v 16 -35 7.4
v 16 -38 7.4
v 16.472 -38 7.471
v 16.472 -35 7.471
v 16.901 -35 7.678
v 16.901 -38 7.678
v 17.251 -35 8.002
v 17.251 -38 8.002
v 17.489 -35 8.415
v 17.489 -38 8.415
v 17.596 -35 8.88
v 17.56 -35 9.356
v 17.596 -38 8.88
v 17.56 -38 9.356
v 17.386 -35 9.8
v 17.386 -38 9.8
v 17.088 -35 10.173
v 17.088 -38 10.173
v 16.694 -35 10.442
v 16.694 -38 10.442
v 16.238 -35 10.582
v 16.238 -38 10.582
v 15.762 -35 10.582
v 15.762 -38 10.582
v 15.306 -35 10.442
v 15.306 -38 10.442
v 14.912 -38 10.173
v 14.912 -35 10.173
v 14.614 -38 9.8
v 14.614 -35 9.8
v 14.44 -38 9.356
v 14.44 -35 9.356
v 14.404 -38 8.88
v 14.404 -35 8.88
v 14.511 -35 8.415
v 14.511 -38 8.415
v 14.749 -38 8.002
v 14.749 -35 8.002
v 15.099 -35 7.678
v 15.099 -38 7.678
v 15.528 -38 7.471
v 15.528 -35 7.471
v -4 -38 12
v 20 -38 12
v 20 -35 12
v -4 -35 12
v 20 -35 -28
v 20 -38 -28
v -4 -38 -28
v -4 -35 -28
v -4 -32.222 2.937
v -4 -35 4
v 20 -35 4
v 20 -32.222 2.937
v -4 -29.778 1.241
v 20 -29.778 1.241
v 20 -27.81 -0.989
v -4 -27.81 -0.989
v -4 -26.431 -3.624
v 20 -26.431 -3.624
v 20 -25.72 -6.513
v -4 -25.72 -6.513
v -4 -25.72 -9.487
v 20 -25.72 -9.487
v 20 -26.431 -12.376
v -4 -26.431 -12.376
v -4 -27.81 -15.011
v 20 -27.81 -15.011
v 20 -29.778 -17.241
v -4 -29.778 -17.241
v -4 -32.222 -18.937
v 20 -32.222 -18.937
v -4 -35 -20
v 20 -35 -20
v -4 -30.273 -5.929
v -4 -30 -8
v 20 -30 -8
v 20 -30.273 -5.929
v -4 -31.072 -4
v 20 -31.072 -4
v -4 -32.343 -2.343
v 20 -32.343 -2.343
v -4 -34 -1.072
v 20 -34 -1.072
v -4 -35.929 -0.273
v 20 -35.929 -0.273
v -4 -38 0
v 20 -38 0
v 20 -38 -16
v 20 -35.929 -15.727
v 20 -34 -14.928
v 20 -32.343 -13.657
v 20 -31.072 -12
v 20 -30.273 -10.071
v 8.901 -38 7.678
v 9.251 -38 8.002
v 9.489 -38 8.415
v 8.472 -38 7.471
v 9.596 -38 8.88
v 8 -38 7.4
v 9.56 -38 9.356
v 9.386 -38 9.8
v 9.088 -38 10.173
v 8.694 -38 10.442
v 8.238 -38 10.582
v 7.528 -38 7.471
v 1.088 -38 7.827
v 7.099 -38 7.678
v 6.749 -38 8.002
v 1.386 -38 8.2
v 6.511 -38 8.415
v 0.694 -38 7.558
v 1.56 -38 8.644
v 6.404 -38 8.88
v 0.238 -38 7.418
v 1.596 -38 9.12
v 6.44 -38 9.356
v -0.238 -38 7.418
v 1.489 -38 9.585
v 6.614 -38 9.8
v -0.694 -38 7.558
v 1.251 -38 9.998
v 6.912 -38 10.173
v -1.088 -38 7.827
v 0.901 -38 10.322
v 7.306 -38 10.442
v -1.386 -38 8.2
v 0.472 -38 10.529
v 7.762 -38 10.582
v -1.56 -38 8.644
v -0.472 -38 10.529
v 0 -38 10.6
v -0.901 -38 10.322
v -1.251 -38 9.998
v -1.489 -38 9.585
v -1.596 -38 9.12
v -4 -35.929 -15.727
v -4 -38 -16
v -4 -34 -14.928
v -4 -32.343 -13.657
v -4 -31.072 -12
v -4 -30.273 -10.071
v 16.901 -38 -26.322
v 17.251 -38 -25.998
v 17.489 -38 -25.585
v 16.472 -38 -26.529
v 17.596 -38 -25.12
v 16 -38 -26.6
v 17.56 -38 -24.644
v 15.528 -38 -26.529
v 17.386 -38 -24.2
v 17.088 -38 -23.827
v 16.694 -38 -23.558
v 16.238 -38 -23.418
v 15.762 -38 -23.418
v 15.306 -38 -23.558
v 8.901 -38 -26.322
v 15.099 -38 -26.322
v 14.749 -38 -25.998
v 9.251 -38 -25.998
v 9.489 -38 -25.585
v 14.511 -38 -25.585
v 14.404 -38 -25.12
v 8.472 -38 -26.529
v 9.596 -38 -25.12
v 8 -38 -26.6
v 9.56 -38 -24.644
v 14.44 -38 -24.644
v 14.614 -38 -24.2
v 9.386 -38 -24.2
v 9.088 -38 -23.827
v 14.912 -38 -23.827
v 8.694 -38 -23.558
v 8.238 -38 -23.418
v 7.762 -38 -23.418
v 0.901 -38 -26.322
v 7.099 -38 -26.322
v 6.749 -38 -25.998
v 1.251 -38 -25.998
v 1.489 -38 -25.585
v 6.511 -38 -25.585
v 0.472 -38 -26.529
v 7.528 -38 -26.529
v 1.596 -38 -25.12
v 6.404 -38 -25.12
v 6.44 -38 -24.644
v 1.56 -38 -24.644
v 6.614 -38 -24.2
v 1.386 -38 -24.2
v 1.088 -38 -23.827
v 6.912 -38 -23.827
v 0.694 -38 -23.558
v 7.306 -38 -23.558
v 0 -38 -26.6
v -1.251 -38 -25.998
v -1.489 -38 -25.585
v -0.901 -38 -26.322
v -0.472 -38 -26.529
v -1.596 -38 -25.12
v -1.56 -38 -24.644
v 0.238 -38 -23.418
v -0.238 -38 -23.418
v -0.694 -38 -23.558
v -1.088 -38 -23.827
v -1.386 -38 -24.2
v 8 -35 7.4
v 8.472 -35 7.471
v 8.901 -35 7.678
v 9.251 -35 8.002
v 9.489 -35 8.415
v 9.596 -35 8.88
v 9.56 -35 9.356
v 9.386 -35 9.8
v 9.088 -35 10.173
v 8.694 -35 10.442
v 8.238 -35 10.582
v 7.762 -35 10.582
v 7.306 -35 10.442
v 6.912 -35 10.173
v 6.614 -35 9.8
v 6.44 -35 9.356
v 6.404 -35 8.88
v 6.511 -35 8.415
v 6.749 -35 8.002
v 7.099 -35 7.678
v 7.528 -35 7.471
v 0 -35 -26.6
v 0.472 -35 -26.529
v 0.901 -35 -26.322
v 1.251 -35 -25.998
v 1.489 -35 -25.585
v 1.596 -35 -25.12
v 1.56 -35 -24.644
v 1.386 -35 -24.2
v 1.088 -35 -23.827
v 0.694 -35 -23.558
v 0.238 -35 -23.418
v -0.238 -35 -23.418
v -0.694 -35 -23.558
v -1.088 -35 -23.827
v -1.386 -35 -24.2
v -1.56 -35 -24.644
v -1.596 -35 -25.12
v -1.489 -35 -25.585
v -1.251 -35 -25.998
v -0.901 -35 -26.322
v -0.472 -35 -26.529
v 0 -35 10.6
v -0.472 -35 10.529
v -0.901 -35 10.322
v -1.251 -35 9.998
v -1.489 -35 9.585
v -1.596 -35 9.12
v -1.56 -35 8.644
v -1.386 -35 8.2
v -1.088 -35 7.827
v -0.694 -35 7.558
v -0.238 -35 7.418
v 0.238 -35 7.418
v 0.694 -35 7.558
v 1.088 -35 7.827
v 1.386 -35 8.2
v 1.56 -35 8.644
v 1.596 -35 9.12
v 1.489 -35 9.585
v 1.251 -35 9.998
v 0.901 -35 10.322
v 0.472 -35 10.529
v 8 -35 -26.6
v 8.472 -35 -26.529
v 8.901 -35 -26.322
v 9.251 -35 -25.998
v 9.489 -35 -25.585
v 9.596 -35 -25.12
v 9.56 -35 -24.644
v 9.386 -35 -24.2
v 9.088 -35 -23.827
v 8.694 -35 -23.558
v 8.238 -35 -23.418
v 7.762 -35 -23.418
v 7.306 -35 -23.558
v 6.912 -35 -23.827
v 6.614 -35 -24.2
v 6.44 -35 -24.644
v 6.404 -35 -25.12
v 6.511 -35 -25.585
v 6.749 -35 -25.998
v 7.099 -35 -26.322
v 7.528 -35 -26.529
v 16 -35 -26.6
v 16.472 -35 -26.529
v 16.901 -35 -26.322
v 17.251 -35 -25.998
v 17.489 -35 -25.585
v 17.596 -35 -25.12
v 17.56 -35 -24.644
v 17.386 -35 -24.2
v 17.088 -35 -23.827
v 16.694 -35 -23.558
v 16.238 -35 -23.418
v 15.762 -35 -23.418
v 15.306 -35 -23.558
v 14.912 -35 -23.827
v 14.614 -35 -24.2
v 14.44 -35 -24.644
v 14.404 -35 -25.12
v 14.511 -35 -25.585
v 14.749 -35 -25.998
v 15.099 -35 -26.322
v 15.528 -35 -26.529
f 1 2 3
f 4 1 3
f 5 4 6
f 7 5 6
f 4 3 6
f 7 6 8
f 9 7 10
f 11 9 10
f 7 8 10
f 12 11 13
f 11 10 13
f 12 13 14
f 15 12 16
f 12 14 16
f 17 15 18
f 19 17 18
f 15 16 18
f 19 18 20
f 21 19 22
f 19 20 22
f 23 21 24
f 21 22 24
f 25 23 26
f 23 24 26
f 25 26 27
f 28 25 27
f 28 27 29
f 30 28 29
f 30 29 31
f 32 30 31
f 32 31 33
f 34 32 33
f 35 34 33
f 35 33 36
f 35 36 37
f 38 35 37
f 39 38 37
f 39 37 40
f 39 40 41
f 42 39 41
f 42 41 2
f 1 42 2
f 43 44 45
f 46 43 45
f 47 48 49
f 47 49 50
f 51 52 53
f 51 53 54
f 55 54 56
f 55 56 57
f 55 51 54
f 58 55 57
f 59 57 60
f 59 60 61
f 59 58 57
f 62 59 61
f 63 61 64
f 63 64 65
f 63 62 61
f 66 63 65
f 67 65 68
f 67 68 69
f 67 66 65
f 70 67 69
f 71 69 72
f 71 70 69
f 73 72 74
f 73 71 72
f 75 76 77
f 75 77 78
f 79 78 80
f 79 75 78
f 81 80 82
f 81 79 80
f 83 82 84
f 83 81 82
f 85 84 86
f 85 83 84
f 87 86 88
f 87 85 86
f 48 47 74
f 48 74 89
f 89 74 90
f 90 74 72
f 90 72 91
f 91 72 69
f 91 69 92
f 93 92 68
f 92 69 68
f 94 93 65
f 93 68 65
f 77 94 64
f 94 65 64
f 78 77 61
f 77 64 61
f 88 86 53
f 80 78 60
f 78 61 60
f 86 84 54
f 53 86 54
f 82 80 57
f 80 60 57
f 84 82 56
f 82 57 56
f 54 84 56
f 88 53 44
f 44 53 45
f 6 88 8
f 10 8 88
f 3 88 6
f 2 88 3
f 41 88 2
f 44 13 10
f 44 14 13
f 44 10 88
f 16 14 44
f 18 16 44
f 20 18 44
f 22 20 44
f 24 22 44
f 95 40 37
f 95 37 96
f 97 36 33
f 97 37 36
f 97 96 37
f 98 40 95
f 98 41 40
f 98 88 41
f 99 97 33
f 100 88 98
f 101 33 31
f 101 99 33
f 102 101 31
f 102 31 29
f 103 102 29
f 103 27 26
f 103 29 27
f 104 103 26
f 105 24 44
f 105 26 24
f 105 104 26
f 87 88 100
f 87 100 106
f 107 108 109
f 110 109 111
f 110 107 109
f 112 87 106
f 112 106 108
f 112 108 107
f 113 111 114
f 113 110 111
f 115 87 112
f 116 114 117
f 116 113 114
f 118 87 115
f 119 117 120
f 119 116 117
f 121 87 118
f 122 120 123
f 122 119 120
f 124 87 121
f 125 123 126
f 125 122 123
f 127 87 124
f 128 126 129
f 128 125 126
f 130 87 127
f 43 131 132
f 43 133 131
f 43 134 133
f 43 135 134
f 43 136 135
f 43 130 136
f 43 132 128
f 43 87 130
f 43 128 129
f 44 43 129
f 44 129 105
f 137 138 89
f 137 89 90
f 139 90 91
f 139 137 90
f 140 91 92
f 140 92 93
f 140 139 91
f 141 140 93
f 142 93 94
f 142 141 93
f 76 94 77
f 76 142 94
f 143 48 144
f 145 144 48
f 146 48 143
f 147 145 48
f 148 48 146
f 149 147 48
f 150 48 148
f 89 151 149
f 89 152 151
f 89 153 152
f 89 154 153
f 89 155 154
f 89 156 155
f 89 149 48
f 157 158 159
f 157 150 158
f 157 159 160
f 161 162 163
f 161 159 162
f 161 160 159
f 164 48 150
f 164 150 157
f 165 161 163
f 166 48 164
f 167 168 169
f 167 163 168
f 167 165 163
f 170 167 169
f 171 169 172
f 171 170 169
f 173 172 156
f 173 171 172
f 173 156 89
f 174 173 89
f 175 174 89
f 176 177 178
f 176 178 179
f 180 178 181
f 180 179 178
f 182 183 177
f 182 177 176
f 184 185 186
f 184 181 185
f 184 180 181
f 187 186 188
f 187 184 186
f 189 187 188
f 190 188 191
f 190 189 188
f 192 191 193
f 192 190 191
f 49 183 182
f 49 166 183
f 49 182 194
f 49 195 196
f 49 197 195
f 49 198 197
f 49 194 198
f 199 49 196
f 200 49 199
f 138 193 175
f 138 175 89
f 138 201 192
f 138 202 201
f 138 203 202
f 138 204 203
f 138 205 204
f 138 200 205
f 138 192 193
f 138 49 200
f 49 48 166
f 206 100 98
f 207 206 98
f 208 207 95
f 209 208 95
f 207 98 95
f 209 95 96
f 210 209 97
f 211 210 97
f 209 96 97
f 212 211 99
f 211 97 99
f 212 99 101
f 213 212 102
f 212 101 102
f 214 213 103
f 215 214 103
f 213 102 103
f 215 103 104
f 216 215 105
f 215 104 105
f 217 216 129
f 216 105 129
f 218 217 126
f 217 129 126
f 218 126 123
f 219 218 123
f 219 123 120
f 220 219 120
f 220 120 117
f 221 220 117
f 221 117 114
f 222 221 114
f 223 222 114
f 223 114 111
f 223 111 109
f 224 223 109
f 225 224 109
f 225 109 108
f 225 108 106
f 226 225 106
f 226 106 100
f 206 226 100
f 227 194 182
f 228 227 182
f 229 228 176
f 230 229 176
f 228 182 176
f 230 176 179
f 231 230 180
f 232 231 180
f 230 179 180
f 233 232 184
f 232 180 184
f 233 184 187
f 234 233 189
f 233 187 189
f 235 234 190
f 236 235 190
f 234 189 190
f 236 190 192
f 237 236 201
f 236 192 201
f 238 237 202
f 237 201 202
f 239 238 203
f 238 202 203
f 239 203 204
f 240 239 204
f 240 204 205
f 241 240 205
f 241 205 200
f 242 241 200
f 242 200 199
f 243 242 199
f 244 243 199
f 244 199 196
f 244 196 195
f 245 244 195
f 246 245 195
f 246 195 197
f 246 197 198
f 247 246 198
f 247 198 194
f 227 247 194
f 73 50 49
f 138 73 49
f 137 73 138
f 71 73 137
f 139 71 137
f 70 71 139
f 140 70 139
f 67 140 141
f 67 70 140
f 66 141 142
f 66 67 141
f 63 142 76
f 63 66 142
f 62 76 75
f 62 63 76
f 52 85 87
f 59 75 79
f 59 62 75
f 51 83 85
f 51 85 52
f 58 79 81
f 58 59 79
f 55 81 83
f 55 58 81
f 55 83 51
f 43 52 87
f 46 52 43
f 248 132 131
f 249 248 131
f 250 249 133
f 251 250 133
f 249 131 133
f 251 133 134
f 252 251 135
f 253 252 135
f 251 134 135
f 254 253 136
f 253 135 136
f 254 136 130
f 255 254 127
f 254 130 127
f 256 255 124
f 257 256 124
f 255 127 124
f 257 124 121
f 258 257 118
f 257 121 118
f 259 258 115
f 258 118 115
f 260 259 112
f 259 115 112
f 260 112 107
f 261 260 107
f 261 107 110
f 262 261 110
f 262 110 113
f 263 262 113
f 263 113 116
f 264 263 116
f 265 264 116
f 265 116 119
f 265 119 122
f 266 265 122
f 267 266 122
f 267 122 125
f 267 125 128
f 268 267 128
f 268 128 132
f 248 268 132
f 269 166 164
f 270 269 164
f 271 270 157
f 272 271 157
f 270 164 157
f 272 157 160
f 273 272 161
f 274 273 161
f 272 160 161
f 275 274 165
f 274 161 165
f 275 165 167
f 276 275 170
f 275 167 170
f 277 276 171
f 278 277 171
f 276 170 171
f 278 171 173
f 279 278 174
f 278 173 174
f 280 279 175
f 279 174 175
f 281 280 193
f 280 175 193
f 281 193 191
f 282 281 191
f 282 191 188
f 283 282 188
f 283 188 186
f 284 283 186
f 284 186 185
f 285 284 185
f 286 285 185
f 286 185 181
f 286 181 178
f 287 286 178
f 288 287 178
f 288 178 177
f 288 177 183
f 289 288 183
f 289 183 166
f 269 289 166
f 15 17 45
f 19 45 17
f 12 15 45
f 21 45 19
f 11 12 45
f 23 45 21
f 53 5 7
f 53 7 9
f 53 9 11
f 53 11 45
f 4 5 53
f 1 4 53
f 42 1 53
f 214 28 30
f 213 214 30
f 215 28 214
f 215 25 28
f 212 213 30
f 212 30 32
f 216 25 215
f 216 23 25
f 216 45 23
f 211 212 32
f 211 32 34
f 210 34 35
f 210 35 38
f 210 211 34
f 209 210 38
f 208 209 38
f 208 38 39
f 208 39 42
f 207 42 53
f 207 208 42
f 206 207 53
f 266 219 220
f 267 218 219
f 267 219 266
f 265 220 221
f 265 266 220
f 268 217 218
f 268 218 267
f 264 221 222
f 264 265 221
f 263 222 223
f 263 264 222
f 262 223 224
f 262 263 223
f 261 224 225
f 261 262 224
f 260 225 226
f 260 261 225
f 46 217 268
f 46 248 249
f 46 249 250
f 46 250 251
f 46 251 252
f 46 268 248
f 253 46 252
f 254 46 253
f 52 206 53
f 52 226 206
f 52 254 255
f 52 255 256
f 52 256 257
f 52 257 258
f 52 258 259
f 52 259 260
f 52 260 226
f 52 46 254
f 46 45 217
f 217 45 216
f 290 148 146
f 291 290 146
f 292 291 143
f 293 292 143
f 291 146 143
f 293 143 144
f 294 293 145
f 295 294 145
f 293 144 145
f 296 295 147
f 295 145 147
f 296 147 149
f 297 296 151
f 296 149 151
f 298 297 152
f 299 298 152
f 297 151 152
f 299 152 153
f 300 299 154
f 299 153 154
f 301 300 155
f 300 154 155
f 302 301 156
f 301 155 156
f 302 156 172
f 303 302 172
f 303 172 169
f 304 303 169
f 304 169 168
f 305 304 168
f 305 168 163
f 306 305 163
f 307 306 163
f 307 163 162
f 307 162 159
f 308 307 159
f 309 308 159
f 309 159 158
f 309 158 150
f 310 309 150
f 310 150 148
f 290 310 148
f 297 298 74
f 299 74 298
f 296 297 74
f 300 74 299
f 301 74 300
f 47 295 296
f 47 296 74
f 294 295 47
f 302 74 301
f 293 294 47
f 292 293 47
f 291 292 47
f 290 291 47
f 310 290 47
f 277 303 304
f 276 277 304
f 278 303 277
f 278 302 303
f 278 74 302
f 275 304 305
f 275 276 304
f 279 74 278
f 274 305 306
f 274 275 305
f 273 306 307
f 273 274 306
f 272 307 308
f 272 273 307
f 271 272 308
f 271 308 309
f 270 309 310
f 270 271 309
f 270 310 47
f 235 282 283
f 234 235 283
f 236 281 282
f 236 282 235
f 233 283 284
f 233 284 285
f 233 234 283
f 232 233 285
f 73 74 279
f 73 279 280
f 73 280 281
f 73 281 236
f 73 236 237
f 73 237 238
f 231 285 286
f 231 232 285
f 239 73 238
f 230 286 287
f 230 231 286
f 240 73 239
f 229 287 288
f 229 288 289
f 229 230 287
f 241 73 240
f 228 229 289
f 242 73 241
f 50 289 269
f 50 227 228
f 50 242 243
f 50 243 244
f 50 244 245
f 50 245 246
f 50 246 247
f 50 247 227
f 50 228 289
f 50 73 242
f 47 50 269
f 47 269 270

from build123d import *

# Parameters (mm, degrees)
SKETCH_1_W          = 16
SKETCH_1_H          = 16
EXTRUDE_1_DEPTH     = 20
SKETCH_2_W          = 24
SKETCH_2_H          = 24
EXTRUDE_4_DEPTH     = 10
SKETCH_3_W          = 4
SKETCH_3_H          = 3
EXTRUDE_6_DEPTH     = 24
SKETCH_5_R          = 1.6
CUT_EXTRUDE_1_DEPTH = 24
CUT_EXTRUDE_2_DEPTH = 24


with BuildPart() as part:
    # 草图1 → 凸台-拉伸1 (new body)
    with BuildSketch(Plane(origin=(0, 0, 0), x_dir=(1, 0, 0), z_dir=(0, 1, 0))):
        Polygon((-4, 20), (-4, 16), (-4, -4), (16, -4), (20, -4), (20, 0), (20, 20), (0, 20), align=None)
        with Locations((8, 8)):
            Rectangle(SKETCH_1_W, SKETCH_1_H, mode=Mode.SUBTRACT)
    extrude(amount=-EXTRUDE_1_DEPTH)

    # 草图2 → 凸台-拉伸4 (add)
    with BuildSketch(Plane.XZ.offset(20)):
        with Locations((8, -8)):
            Rectangle(SKETCH_2_W, SKETCH_2_H)
    extrude(amount=EXTRUDE_4_DEPTH)

    # 草图3 → 凸台-拉伸6 (add)
    with BuildSketch(Plane.ZY.offset(4)):
        with Locations((10, -36.5)):
            Rectangle(SKETCH_3_W, SKETCH_3_H)
        with BuildLine():
            Line((4, -35), (4, -30))
            Line((4, -30), (-8.000000062, -30))
            ThreePointArc((-8.000000062, -30), (-2.343145773, -32.343145728), (0, -38))
            Line((0, -38), (8, -38))
            Line((8, -38), (8, -35))
            Line((8, -35), (4, -35))
        make_face()
        with BuildLine():
            ThreePointArc((-16, -38), (-13.656854272, -32.343145773), (-8.000000062, -30))
            Line((-8.000000062, -30), (-20, -30))
            Line((-20, -30), (-20, -35))
            Line((-20, -35), (-24, -35))
            Line((-24, -35), (-24, -38))
            Line((-24, -38), (-16, -38))
        make_face()
        with Locations((-26, -36.5)):
            Rectangle(SKETCH_3_W, SKETCH_3_H)
    extrude(amount=-EXTRUDE_6_DEPTH)

    # 草图5 → 切除-拉伸1 (cut)
    with BuildSketch(Plane.XZ.offset(38)):
        with Locations(Location((8, 9, 0), (0, 0, 270))):
            Circle(SKETCH_5_R)
        with Locations(Location((16, 9, 0), (0, 0, 270))):
            Circle(SKETCH_5_R)
        with Locations(Location((0, 9, 0), (0, 0, 90))):
            Circle(SKETCH_5_R)
        with Locations(Location((0, -25, 0), (0, 0, 270))):
            Circle(SKETCH_5_R)
        with Locations(Location((8, -25, 0), (0, 0, 270))):
            Circle(SKETCH_5_R)
        with Locations(Location((16, -25, 0), (0, 0, 270))):
            Circle(SKETCH_5_R)
    extrude(amount=-CUT_EXTRUDE_1_DEPTH, mode=Mode.SUBTRACT)

    # 草图6 → 切除-拉伸2 (cut)
    with BuildSketch(Plane.ZY.offset(4)):
        with BuildLine():
            Line((-20, -35), (-20, 0))
            Line((-20, 0), (4, 0))
            Line((4, 0), (4, -35))
            ThreePointArc((4, -35), (-8, -25.630683123), (-20, -35))
        make_face()
    extrude(amount=-CUT_EXTRUDE_2_DEPTH, mode=Mode.SUBTRACT)


solid = part.part
